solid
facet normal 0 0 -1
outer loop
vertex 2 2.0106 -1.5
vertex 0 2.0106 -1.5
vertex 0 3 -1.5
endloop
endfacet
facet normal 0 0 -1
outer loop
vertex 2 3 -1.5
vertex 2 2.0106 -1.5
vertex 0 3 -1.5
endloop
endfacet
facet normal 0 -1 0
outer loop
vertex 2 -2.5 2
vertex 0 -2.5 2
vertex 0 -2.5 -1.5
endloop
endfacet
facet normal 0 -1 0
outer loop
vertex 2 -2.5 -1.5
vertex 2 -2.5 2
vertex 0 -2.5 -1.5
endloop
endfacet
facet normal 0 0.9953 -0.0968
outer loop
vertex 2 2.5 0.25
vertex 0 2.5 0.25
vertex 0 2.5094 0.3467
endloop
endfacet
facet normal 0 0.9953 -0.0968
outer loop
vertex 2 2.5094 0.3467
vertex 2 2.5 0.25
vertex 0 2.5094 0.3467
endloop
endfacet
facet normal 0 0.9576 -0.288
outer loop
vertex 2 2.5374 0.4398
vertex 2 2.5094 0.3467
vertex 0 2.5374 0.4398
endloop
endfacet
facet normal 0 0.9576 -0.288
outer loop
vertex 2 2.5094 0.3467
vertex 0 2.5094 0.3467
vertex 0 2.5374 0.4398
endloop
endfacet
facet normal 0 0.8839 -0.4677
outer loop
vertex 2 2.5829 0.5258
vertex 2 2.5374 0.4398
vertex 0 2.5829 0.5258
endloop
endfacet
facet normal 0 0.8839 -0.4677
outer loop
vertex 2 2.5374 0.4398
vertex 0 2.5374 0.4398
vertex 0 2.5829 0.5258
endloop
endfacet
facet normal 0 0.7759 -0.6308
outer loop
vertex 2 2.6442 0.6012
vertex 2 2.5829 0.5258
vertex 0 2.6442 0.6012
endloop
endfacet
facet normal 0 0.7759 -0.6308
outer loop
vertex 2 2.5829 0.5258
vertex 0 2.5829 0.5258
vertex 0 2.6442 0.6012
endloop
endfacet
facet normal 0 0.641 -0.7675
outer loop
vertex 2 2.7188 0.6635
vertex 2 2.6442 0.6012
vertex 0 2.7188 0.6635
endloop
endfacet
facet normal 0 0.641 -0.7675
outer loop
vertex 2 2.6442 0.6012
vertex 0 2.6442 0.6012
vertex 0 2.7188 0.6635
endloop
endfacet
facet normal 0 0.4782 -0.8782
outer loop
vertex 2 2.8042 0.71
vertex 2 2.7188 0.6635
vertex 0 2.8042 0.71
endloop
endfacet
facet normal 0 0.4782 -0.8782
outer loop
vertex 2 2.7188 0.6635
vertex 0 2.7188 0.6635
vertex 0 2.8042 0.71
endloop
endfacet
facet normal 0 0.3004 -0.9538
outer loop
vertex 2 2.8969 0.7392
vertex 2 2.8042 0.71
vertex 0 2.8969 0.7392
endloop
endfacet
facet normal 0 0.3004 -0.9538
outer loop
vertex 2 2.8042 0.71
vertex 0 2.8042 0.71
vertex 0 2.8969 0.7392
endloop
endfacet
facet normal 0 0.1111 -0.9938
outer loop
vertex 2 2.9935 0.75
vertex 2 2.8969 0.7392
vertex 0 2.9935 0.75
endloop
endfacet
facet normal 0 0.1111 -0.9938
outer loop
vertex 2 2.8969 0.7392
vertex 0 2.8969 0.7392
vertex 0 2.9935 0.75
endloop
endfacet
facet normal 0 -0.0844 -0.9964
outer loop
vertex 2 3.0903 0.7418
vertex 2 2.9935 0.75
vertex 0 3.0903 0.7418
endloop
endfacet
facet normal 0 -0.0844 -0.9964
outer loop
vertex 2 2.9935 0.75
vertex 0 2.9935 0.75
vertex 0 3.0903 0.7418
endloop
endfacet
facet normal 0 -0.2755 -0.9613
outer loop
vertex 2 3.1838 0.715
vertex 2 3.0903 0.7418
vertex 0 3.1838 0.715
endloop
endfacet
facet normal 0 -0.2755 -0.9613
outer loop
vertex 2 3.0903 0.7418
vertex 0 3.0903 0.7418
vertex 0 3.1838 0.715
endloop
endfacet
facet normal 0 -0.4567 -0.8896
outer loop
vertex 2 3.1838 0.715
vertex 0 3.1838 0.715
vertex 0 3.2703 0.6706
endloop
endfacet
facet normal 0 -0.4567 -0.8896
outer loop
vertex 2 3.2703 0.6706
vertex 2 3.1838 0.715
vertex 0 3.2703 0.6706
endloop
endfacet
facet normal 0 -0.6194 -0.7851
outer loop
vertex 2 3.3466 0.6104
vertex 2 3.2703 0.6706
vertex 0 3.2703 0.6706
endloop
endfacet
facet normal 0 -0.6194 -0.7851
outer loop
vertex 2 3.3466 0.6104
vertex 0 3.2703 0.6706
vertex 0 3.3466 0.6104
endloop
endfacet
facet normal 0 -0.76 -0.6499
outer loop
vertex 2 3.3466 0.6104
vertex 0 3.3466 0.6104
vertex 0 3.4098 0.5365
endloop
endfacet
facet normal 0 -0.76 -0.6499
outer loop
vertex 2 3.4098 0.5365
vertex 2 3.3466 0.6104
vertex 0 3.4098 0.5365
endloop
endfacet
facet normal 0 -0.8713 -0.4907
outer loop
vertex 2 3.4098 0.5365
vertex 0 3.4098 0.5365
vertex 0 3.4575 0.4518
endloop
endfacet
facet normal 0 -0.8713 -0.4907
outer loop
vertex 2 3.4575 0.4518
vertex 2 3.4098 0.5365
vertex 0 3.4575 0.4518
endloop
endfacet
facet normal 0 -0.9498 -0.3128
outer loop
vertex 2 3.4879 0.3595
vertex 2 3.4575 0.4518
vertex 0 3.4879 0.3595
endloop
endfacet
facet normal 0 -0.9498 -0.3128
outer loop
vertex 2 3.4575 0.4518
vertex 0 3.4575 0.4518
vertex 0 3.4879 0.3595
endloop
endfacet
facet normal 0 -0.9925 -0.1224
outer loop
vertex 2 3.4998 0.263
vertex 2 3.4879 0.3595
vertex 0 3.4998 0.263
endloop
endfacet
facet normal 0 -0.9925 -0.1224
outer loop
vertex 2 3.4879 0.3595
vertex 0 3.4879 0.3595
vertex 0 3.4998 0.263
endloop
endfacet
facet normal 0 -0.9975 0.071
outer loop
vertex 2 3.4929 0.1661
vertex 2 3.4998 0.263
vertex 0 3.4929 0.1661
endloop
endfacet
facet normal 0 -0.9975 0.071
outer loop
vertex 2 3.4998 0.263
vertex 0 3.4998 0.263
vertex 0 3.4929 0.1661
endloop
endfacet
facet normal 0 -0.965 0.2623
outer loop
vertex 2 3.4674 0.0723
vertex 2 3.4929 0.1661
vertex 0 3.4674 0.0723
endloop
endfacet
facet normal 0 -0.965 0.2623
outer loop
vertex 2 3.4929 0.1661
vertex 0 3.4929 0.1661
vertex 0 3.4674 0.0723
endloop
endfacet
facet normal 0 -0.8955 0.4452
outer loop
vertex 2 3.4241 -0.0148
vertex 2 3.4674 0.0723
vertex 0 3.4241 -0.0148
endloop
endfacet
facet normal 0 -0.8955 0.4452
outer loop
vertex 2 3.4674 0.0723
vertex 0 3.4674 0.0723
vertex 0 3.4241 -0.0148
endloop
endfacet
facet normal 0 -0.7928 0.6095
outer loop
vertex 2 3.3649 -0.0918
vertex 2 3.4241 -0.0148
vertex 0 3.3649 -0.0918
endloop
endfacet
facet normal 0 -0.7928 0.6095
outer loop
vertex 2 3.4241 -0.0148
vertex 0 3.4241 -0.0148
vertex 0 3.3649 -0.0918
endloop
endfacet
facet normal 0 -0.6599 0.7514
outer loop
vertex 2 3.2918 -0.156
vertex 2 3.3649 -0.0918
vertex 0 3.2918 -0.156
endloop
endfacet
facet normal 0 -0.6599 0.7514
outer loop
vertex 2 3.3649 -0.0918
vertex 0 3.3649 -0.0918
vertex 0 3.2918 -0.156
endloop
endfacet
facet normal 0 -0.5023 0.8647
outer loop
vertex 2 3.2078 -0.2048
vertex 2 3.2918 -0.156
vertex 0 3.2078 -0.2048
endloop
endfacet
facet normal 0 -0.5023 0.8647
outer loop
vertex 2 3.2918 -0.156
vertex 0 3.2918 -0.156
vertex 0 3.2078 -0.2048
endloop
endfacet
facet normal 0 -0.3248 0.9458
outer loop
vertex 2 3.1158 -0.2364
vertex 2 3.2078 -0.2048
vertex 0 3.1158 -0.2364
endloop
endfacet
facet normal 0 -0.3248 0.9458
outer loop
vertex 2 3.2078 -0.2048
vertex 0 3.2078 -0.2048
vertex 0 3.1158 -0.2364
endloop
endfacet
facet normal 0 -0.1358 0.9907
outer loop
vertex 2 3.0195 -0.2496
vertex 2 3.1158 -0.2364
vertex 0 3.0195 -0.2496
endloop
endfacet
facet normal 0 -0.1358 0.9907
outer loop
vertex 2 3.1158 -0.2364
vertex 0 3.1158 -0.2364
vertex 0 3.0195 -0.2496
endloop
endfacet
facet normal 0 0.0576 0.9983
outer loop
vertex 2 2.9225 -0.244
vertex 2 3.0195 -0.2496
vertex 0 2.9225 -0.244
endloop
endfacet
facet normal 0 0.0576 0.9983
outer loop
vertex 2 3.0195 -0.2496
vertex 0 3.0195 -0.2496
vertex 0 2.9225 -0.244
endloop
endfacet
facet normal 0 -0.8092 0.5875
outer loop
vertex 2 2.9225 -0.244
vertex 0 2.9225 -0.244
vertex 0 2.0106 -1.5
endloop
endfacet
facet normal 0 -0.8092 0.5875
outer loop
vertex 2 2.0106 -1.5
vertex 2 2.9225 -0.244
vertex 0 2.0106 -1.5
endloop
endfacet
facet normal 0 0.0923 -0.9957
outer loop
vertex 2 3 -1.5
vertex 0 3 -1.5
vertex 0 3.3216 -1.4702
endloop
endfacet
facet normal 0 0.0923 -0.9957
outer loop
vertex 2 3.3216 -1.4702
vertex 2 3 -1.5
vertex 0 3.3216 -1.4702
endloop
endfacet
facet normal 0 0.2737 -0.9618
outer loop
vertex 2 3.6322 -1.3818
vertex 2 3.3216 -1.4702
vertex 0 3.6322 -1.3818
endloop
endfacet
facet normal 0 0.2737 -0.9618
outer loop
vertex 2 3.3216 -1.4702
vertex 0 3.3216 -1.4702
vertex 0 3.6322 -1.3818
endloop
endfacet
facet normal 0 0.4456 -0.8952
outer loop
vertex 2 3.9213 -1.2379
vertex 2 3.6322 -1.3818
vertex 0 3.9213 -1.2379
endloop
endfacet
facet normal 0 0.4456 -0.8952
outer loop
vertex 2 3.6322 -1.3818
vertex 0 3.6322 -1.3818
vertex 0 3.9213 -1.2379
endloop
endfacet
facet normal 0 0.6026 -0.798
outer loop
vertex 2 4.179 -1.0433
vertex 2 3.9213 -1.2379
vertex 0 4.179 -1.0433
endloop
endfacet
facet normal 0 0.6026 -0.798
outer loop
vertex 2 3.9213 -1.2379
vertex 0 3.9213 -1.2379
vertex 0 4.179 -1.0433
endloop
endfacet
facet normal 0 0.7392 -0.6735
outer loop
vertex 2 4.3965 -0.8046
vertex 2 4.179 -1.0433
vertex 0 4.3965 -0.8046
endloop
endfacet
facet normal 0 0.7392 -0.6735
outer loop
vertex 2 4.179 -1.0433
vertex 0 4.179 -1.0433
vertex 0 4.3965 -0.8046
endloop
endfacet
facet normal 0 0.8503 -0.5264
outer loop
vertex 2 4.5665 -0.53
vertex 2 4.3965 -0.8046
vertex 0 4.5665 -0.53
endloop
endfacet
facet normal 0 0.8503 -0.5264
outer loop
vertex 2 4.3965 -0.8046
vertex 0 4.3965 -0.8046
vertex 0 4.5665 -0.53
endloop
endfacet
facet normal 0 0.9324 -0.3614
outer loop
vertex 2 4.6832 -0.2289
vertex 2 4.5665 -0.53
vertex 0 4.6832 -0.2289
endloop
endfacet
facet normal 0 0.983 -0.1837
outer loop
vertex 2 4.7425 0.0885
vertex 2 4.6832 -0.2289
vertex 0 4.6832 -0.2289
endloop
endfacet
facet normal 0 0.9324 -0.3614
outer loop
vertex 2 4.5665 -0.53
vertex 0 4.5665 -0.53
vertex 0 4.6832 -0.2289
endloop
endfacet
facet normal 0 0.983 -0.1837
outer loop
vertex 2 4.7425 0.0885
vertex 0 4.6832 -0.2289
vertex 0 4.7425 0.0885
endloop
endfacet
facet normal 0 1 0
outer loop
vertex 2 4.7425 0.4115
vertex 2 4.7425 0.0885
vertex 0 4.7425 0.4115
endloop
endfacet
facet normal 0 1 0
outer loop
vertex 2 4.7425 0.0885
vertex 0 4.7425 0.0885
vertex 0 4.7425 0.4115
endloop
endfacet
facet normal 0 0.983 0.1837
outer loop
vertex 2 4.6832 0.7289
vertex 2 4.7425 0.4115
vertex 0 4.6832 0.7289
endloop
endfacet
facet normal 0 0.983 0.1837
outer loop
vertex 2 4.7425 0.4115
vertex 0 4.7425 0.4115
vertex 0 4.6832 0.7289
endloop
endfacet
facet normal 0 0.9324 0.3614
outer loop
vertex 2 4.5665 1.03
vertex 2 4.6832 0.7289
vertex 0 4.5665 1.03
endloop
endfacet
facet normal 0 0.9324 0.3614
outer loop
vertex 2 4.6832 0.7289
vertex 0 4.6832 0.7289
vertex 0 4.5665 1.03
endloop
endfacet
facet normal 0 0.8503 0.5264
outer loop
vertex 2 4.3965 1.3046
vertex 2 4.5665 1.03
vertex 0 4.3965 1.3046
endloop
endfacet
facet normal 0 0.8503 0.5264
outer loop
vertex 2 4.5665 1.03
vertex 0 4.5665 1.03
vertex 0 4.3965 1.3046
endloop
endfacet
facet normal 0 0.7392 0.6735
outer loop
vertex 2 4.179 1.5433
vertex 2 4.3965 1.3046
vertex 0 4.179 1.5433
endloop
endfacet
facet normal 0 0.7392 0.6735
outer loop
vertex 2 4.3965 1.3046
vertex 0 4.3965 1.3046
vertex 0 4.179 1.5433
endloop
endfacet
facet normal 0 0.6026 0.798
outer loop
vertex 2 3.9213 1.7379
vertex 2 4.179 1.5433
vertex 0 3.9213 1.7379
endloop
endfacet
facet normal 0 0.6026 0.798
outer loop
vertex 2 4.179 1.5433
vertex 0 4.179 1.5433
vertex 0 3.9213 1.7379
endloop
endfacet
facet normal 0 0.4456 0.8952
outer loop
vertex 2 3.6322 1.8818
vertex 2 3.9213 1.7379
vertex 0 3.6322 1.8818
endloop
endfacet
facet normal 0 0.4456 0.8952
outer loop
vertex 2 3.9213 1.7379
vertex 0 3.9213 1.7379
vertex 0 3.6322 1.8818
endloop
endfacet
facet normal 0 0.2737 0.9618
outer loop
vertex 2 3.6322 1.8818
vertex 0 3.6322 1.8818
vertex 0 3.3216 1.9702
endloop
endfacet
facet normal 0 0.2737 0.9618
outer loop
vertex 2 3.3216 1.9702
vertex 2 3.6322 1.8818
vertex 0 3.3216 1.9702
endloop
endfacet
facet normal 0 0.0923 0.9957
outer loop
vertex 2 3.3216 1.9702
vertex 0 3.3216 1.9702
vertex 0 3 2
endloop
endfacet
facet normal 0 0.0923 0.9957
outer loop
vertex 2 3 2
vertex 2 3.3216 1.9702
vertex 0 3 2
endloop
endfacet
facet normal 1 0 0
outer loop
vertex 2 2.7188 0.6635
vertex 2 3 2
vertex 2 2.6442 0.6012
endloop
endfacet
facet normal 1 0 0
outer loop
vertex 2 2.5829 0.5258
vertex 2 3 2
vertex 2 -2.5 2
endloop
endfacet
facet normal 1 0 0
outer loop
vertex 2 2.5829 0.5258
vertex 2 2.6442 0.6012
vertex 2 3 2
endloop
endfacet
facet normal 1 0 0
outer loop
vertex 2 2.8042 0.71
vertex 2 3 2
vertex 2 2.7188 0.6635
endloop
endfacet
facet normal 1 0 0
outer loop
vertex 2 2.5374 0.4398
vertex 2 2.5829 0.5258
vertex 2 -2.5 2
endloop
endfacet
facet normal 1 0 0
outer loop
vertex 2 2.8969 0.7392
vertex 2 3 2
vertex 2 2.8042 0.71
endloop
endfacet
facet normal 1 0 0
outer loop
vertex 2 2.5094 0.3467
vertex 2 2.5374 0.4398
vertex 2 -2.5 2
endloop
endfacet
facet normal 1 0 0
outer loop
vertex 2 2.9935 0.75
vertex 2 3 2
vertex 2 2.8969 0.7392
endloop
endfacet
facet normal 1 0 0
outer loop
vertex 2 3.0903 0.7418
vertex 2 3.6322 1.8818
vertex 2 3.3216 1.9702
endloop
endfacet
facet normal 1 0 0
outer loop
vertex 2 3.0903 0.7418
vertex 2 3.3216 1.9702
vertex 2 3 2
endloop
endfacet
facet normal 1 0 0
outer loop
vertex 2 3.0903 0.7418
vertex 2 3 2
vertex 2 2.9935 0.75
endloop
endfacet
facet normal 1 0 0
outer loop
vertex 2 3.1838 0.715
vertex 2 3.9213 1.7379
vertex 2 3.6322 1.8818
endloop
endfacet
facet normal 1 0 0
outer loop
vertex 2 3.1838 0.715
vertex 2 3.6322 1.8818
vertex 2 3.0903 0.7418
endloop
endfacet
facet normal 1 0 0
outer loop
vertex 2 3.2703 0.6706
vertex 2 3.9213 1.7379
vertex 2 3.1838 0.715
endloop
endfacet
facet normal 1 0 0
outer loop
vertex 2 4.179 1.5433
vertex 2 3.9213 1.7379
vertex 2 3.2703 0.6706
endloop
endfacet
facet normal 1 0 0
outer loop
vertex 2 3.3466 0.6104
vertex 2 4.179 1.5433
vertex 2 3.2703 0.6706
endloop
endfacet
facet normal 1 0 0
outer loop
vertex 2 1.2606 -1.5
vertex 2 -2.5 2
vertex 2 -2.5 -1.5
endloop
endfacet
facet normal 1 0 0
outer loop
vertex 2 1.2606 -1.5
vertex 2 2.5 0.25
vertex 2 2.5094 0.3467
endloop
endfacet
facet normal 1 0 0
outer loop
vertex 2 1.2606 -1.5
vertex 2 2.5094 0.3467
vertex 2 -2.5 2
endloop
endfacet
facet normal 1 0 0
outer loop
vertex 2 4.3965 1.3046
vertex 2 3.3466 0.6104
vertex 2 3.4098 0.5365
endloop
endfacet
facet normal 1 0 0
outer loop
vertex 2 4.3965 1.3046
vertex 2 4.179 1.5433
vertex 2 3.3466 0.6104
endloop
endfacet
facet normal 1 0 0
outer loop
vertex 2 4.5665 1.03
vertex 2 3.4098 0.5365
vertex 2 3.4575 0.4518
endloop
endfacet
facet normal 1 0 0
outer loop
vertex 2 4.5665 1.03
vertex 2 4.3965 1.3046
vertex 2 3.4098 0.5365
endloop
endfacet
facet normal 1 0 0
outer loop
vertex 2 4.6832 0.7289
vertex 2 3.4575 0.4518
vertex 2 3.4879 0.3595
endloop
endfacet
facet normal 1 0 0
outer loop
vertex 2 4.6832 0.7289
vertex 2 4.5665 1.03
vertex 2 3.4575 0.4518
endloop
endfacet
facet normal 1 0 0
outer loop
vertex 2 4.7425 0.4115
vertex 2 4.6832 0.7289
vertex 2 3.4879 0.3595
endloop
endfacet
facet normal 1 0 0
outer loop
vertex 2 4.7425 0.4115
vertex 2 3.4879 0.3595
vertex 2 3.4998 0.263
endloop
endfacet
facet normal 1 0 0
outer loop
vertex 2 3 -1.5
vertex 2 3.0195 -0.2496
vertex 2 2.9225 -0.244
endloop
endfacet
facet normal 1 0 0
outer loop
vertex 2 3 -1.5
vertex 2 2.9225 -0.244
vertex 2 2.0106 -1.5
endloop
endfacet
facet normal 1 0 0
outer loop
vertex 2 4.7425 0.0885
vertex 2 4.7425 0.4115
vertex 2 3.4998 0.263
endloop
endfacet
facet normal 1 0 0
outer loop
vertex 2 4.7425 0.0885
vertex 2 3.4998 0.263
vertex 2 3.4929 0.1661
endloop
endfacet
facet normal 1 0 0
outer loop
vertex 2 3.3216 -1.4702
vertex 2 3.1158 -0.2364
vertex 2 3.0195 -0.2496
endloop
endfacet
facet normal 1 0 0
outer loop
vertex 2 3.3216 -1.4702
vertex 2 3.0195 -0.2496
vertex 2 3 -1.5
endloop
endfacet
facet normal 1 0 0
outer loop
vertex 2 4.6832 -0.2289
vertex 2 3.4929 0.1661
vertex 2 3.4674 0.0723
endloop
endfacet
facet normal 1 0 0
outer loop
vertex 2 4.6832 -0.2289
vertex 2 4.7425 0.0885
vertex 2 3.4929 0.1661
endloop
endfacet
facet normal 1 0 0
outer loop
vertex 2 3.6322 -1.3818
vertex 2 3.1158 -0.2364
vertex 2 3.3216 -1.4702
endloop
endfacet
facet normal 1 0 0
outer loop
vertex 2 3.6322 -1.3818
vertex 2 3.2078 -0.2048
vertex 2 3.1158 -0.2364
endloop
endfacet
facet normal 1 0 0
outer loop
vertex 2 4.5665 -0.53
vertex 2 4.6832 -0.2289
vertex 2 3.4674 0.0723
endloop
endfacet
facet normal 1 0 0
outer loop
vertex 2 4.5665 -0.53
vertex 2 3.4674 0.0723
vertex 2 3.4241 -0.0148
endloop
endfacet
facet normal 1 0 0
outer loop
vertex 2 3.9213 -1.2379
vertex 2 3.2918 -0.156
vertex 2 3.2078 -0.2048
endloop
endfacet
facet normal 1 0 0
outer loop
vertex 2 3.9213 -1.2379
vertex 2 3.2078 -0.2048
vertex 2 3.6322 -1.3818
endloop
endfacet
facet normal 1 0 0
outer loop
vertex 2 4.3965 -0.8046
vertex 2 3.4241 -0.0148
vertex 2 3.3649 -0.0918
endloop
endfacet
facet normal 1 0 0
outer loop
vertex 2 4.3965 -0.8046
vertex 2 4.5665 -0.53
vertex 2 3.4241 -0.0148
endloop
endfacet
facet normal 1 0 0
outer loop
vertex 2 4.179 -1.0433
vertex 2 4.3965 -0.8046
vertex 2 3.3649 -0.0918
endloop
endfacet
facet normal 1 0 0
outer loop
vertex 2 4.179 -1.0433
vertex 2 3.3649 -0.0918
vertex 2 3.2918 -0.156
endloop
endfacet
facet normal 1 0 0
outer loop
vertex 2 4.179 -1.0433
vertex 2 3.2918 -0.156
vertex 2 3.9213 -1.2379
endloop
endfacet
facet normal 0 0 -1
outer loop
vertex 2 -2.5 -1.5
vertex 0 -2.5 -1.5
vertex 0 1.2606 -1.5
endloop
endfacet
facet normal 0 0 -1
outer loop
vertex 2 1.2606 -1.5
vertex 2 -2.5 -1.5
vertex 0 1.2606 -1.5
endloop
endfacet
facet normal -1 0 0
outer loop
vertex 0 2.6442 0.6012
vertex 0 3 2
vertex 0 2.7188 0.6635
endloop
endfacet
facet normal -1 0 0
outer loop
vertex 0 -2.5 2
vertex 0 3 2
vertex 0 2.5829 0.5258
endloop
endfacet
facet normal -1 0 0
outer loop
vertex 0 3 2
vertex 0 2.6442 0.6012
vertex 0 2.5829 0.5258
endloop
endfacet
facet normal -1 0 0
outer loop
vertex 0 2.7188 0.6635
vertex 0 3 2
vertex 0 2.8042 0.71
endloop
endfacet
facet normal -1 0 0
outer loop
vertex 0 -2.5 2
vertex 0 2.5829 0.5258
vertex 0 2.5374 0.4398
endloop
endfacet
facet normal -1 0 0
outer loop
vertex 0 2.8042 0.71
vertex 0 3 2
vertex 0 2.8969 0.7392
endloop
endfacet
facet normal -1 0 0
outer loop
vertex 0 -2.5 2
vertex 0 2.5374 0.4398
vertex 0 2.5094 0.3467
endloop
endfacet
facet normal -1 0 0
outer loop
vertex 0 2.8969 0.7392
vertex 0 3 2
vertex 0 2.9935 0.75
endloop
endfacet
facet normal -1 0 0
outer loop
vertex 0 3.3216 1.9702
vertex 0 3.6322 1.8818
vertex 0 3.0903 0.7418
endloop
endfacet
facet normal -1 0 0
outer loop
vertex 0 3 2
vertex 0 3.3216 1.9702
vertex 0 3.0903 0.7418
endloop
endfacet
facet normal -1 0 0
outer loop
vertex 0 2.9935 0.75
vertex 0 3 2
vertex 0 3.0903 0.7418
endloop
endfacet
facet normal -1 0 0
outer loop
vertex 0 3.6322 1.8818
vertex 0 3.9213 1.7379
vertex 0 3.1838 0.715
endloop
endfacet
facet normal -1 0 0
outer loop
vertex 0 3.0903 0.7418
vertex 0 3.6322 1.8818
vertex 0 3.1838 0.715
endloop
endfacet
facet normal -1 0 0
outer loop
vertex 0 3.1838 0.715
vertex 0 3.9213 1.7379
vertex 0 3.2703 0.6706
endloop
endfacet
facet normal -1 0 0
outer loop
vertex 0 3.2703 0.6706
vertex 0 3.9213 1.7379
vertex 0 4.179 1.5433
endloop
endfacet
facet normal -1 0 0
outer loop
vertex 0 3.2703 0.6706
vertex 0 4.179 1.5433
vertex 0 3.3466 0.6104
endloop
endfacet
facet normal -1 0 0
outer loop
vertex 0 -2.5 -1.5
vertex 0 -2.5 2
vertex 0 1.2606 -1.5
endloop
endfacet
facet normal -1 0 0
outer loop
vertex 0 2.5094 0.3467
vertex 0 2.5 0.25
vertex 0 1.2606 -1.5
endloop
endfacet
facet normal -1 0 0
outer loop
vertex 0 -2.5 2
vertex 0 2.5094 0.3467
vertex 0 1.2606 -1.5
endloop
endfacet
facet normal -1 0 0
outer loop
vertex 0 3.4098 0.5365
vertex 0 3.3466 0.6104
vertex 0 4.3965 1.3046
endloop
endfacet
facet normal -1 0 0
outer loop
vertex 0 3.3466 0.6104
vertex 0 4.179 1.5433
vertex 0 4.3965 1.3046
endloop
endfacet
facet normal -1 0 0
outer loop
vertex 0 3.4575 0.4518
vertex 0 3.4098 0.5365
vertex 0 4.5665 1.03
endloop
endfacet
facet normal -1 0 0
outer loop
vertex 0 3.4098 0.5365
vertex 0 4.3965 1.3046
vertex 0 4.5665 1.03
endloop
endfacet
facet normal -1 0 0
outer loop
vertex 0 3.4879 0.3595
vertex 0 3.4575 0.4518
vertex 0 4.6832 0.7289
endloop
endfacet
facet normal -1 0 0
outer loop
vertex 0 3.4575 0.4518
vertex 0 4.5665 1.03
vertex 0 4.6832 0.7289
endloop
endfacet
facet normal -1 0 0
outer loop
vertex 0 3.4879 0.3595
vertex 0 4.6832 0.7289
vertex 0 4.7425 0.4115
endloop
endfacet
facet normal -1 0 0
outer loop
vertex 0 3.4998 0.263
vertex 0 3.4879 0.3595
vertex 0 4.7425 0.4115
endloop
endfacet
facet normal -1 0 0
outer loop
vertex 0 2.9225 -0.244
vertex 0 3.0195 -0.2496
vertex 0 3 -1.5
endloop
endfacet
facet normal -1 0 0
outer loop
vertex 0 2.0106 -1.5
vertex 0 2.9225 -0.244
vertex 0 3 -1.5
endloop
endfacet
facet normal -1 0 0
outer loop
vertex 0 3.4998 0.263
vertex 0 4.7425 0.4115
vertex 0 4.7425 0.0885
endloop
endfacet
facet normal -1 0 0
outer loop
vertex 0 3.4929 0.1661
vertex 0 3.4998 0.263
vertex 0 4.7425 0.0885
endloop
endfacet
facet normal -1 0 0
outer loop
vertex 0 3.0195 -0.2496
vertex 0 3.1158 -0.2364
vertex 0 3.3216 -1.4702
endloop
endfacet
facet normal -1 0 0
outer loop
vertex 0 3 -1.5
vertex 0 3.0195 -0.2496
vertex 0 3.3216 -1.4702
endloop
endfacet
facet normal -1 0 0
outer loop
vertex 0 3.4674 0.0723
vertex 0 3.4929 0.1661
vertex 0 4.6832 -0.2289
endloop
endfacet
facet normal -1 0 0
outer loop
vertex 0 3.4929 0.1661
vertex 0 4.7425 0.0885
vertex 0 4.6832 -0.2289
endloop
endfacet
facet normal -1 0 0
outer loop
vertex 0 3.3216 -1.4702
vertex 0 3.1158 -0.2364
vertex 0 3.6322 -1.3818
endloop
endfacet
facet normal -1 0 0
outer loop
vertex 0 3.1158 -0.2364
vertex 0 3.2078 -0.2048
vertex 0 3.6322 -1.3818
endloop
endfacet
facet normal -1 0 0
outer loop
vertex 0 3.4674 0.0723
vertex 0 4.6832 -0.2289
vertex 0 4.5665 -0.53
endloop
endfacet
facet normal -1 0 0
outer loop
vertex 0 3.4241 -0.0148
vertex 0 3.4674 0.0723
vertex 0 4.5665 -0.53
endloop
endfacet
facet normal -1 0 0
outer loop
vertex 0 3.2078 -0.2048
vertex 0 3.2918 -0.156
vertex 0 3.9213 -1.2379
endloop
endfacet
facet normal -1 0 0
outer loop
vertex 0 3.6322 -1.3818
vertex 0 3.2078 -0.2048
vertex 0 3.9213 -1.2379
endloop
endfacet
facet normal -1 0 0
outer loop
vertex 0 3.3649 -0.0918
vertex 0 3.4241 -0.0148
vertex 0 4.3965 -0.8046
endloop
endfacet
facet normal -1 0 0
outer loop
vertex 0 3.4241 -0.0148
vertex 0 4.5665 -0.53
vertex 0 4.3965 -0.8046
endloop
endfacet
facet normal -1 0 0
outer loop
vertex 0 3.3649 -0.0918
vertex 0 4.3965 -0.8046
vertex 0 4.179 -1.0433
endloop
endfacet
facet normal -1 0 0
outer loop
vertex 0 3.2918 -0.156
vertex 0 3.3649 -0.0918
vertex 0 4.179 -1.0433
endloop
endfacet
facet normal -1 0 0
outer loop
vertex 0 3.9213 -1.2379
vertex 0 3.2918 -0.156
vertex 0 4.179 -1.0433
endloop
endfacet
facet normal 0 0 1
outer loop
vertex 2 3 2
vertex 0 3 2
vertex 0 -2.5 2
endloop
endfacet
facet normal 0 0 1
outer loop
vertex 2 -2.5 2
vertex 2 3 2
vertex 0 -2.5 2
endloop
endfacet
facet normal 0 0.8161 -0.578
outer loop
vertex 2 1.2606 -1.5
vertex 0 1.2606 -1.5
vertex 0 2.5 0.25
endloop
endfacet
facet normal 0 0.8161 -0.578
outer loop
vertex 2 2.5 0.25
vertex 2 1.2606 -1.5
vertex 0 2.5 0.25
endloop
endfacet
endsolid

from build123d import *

# Parameters (mm, degrees)
BOSS_EXTRUDE1_DEPTH = 2


with BuildPart() as part:
    # Sketch1 → Boss-Extrude1 (new body)
    with BuildSketch(Plane(origin=(0, 0, 0), x_dir=(0, 0, -1), z_dir=(1, 0, 0))):
        with BuildLine():
            Line((-2, -2.5), (1.5, -2.5))
            Line((1.5, -2.5), (1.5, 0.193510405))
            Line((1.5, 0.193510405), (1.5, 0.544384676))
            Line((1.5, 0.544384676), (1.5, 1.260642871))
            Line((1.5, 1.260642871), (-0.25, 2.5))
            ThreePointArc((-0.25, 2.5), (-0.575, 3.379967104), (0.243957235, 2.9225))
            Line((0.243957235, 2.9225), (1.5, 2.010642871))
            Line((1.5, 2.010642871), (1.5, 3))
            ThreePointArc((1.5, 3), (-0.25, 4.75), (-2, 3))
            Line((-2, 3), (-2, -2.5))
        make_face()
    extrude(amount=BOSS_EXTRUDE1_DEPTH)


solid = part.part
